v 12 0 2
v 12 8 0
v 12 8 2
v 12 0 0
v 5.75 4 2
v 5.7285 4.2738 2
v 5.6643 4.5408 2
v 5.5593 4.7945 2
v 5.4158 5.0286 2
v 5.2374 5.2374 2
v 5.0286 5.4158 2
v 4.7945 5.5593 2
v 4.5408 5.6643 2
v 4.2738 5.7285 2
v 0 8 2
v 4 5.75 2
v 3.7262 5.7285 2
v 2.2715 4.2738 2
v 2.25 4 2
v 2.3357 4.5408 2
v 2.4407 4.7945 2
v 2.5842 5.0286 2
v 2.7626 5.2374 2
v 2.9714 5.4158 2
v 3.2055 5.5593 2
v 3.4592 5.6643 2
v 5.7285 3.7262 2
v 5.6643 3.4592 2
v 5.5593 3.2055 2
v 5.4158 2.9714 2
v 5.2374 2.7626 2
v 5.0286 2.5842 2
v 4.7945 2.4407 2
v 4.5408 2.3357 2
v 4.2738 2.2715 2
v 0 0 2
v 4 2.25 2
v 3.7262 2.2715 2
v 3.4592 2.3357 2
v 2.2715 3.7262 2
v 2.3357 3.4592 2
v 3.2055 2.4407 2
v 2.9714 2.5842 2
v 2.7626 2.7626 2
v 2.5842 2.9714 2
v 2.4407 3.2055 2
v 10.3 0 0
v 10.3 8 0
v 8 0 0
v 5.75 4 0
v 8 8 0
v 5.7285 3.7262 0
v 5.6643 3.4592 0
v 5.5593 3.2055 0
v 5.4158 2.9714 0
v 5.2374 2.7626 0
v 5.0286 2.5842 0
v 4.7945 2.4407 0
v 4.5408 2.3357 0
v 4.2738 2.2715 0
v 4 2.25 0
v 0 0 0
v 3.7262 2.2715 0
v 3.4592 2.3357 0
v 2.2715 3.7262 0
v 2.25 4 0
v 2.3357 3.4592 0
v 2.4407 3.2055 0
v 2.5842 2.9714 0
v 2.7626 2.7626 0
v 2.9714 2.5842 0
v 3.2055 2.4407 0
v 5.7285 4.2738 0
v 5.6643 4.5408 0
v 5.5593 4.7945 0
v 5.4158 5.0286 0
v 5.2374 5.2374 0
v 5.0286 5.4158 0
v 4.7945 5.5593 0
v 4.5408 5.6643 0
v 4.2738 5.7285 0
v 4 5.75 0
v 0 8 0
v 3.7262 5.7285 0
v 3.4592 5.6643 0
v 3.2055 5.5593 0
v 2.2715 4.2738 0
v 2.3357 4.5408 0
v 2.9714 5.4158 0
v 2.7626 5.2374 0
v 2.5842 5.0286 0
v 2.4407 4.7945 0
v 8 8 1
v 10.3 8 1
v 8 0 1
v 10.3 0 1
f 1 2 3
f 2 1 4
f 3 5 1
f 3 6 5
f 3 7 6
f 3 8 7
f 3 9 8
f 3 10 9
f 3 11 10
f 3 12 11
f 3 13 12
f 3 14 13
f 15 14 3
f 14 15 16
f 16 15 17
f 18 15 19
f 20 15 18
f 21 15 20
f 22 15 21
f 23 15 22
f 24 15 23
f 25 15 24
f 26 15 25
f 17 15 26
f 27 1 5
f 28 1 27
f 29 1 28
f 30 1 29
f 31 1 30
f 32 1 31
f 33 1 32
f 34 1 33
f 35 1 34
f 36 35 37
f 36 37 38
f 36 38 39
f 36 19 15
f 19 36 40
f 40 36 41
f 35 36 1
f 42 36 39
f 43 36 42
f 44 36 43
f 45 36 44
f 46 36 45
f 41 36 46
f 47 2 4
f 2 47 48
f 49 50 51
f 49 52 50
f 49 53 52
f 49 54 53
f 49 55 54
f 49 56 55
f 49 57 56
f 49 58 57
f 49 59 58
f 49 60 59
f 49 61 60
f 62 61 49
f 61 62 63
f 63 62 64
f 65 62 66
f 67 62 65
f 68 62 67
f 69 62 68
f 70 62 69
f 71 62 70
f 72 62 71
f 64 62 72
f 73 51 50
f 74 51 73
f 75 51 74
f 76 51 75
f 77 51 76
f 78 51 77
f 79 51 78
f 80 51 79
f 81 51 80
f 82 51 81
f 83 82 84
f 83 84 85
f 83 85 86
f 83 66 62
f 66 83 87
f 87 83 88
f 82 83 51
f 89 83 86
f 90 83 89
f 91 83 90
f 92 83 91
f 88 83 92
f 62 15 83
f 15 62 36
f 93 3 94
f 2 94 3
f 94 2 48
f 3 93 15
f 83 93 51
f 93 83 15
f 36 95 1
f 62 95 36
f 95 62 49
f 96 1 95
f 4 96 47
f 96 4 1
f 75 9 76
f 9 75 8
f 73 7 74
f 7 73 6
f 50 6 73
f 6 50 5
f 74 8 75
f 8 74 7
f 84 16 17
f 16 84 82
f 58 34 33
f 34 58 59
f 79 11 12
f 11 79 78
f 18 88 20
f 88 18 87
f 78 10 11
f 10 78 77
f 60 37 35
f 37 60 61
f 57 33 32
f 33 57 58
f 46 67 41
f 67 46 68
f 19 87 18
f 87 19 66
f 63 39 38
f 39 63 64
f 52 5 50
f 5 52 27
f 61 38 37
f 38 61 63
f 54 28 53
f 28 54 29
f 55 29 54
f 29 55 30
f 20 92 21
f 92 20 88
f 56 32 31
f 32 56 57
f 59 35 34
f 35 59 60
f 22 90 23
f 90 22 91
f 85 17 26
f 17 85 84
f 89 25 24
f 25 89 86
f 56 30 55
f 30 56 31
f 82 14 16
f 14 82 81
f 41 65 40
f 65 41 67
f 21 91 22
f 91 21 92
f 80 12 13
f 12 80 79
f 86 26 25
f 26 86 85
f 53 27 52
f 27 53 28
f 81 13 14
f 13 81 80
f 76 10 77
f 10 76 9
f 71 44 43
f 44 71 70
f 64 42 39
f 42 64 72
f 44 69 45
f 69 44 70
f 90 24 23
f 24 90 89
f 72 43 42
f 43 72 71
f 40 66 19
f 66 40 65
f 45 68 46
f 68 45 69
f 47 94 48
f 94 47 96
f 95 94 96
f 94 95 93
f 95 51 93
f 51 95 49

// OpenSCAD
anzahlKabel = 2;

// Breite pro Kabel
bKabel = 1;

// Höhe pro Kabel
hKabel = 1;

difference() {
    cube(size=[10 + anzahlKabel*bKabel, 8, 1+hKabel]);
    
    // Bohrloch
    translate([4, 4, -1])
        cylinder(10, 3.5/2, 3.5/2, $fn=40);
    
    // Aussparung für Kabel
    translate([8, -5, -1]){
        cube(size=[anzahlKabel*bKabel+0.3, 20, 1+hKabel]);
    }
}
